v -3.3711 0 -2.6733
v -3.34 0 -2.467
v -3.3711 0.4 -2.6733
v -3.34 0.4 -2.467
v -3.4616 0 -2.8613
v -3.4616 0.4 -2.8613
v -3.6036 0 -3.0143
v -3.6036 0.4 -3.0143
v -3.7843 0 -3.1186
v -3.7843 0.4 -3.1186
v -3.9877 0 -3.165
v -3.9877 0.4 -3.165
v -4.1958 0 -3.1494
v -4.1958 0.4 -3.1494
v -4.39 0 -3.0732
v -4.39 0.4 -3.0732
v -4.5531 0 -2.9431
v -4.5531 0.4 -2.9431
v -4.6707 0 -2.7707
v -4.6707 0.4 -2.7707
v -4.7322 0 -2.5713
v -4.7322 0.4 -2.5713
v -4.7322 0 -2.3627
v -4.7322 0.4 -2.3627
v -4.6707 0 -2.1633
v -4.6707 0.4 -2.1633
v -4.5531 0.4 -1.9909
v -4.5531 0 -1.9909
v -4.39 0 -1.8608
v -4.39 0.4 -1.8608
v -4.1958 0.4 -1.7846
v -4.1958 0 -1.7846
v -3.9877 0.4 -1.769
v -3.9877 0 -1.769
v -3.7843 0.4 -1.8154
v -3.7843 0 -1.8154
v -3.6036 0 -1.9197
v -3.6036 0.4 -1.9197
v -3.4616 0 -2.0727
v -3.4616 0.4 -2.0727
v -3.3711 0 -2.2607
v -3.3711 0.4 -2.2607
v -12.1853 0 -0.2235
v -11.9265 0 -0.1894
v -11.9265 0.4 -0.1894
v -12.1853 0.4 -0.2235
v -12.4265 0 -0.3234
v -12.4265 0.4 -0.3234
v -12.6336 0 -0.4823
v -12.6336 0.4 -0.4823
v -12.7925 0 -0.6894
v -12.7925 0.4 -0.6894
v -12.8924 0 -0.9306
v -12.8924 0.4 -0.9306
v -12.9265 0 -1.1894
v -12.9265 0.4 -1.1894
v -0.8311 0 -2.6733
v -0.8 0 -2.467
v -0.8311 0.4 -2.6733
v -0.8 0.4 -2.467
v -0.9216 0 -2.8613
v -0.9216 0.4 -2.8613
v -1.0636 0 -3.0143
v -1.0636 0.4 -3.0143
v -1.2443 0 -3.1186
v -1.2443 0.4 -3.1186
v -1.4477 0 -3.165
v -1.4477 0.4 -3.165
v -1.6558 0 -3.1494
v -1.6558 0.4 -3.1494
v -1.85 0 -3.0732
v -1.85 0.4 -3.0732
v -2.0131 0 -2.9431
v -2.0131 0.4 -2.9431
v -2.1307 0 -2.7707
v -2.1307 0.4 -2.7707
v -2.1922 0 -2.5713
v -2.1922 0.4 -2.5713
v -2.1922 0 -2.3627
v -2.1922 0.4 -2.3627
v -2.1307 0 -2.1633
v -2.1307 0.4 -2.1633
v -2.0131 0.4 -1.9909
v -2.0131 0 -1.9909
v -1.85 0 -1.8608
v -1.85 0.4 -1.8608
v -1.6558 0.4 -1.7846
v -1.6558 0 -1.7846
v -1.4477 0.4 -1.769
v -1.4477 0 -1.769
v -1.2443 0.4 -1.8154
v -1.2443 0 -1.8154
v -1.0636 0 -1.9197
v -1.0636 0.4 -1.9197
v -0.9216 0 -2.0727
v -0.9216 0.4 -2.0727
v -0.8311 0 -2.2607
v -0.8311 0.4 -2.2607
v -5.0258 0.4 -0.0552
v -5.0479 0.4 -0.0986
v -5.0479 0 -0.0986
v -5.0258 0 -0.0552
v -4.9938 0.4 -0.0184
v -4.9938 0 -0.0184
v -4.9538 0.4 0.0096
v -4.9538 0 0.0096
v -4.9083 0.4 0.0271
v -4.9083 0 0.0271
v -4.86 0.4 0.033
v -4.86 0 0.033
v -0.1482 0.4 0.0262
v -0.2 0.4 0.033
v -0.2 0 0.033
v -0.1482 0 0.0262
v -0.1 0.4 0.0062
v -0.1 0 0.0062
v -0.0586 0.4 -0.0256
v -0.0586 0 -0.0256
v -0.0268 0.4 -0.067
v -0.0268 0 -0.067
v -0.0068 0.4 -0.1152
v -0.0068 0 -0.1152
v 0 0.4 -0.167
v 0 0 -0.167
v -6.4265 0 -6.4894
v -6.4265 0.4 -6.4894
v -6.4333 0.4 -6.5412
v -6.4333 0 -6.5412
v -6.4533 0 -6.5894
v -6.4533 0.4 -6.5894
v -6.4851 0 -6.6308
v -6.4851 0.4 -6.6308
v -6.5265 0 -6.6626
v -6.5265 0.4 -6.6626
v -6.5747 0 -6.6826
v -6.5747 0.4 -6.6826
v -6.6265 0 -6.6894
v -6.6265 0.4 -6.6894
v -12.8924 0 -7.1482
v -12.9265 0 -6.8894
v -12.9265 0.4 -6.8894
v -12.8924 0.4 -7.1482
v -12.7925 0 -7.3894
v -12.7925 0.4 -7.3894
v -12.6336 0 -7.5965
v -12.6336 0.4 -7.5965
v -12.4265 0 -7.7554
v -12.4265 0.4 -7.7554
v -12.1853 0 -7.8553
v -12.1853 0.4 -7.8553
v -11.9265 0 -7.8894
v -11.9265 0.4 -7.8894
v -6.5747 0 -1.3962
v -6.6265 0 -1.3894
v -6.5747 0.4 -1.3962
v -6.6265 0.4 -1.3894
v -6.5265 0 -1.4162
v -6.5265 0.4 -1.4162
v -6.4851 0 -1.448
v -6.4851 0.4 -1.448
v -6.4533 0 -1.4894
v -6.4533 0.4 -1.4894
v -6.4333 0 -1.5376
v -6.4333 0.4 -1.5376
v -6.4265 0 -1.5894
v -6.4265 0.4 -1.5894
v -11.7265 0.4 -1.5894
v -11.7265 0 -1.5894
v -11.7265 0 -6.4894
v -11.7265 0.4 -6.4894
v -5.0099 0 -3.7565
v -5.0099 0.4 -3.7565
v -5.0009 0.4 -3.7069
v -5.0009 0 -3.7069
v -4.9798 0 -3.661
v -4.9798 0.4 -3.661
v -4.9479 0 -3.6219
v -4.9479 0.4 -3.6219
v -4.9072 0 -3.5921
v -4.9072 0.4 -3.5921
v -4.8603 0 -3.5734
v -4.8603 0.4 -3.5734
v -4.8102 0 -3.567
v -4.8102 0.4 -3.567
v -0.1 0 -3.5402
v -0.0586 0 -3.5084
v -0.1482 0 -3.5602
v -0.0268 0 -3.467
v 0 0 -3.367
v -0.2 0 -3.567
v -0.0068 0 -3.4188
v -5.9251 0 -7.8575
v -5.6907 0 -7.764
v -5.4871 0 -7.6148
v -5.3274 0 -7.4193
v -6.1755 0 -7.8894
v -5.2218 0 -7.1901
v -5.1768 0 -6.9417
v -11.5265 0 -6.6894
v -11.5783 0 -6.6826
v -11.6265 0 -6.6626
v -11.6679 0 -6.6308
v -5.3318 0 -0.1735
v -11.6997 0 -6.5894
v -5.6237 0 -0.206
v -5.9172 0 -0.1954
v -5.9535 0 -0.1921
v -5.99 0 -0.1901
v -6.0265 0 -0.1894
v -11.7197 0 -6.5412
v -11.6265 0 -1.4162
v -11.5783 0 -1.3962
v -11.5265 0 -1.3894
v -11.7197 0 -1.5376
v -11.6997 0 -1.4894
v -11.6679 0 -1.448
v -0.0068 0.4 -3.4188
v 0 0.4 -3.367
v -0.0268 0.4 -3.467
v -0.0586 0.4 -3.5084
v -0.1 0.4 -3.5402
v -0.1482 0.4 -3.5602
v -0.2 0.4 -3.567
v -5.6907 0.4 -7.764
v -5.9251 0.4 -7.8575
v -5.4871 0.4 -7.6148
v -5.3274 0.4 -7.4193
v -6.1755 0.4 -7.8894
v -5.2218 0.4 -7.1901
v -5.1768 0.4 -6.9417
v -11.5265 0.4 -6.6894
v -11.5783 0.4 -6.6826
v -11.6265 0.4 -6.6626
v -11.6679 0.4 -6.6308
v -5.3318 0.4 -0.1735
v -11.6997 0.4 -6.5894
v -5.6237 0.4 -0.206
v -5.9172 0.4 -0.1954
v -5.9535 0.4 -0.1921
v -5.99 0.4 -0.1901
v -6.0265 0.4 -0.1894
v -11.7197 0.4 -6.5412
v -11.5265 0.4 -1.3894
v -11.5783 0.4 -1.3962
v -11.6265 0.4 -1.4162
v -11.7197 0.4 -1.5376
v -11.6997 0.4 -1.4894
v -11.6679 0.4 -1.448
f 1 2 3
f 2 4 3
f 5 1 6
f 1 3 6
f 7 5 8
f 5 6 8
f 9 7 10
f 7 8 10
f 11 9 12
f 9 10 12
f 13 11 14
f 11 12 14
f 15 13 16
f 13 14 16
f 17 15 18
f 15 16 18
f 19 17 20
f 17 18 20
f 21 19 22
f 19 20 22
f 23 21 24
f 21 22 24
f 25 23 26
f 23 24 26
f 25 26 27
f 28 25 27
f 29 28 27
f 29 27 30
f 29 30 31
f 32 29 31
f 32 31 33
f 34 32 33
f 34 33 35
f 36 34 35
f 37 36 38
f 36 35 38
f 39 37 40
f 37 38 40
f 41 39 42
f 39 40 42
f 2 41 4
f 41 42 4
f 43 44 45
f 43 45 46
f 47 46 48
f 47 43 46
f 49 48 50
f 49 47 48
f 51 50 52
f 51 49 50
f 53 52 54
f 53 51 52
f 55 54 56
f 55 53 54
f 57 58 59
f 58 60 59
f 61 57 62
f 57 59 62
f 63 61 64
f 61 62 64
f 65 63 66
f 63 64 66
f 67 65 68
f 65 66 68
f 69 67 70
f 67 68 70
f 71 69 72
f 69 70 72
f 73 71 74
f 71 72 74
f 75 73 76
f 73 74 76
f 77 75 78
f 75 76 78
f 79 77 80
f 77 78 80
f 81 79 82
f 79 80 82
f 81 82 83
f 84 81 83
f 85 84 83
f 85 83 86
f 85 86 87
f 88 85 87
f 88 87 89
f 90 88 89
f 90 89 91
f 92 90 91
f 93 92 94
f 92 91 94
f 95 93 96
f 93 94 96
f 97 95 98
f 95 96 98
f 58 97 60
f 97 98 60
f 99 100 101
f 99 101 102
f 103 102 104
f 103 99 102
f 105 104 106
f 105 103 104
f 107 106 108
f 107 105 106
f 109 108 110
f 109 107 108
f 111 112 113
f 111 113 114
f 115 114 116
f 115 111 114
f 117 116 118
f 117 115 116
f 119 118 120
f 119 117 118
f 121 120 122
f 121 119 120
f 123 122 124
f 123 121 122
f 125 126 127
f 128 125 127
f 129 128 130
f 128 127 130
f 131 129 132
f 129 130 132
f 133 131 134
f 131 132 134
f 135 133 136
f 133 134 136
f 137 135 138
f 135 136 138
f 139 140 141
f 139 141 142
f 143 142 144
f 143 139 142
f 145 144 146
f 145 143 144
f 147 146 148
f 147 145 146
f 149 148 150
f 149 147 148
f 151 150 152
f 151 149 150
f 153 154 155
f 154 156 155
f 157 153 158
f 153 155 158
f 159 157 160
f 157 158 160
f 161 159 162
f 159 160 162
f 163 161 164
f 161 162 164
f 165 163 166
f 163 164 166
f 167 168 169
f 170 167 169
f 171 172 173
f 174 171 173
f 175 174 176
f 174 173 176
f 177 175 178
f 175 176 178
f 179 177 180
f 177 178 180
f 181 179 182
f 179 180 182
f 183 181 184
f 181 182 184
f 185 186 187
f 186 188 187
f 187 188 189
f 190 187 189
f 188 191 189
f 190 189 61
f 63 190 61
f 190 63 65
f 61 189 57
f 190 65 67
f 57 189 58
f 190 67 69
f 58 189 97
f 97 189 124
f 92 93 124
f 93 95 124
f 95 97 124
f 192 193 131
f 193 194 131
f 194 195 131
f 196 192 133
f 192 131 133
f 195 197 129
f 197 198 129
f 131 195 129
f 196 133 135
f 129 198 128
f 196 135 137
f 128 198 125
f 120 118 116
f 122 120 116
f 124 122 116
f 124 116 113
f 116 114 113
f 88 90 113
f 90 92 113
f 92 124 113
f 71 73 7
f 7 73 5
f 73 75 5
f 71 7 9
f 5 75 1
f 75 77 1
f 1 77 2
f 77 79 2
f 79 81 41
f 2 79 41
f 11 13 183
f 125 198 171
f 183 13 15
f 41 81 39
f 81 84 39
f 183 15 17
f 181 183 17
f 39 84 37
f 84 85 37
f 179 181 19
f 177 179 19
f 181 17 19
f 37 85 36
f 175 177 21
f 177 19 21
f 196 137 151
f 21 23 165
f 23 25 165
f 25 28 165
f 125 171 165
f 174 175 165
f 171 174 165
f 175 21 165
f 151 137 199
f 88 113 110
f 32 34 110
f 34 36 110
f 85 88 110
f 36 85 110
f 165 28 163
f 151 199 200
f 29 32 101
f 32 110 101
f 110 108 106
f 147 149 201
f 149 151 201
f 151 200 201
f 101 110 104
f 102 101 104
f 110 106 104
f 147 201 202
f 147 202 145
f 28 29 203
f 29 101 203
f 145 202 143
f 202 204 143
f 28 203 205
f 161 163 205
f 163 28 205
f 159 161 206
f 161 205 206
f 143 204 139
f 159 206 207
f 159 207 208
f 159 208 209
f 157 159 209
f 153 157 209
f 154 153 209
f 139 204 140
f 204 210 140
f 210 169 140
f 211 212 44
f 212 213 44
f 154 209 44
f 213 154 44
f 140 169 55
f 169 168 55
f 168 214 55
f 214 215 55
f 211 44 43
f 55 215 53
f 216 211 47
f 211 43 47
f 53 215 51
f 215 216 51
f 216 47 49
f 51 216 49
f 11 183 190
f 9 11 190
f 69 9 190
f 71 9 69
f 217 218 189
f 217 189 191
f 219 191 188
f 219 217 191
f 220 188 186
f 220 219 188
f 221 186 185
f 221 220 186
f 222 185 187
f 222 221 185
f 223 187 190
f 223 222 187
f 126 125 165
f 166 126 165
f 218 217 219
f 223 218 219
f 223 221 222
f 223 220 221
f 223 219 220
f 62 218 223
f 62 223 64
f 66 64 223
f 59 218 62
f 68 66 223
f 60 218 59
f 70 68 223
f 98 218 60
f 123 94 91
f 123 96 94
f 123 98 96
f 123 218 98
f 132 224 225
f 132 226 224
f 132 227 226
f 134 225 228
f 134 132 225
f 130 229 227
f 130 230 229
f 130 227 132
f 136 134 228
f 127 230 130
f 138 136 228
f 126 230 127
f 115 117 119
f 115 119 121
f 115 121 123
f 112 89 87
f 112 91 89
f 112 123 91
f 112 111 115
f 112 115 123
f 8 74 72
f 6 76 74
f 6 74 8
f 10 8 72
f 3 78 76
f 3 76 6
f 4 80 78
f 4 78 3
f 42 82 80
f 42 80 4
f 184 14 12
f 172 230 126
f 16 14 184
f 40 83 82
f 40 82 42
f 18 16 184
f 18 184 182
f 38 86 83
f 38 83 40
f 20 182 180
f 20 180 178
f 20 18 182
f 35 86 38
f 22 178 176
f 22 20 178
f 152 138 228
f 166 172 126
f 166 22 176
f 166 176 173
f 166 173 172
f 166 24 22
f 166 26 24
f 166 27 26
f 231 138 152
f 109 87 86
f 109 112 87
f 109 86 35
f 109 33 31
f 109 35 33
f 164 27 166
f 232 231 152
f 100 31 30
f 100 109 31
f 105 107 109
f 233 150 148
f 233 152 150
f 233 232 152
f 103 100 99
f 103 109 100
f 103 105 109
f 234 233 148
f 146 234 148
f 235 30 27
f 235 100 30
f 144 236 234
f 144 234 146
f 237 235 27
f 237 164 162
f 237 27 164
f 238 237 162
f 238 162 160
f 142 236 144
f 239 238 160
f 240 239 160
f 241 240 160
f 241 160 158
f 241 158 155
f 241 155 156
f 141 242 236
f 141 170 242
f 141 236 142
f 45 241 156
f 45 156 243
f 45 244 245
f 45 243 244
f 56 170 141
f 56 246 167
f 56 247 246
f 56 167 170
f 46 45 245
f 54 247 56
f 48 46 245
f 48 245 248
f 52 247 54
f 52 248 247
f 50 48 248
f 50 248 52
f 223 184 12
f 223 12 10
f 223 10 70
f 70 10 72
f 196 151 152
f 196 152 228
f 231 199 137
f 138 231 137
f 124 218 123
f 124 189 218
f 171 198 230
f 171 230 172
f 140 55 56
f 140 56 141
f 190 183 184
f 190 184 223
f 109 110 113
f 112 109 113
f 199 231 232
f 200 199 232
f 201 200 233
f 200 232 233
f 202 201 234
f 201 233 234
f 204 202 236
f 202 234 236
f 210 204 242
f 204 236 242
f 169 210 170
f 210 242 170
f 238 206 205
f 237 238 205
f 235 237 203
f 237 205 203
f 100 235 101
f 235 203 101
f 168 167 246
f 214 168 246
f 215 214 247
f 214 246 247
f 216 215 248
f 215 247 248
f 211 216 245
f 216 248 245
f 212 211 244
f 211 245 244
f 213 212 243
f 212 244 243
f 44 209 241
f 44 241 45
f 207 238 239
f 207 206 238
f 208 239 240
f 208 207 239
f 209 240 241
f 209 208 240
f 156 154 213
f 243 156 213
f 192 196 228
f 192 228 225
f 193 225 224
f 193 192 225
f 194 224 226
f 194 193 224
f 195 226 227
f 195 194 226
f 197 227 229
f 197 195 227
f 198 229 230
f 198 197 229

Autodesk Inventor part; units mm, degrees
ref_plane "YZ Plane" through (0, 0, 0) normal (1, 0, 0) x (0, 1, 0)
ref_plane "XZ Plane" through (0, 0, 0) normal (0, 1, 0) x (-1, 0, 0)
ref_plane "XY Plane" through (0, 0, 0) normal (0, 0, 1) x (1, 0, 0)
sketch "Sketch1" plane through (0, 0, 0) normal (0, 1, 0) x (-1, 0, 0)
  line L0 (5, -3.567) -> (5, 0.033)
  line L1 (5, 0.033) -> (0, 0.033)
  line L2 (5.2265, -7.8894) -> (5, -3.567)
  line L3 (5.2265, -0.5894) -> (5, 0.033)
  line L4 (0, -3.567) -> (0, 0.033)
  line L5 (5, -3.567) -> (0, -3.567)
  line L6 (5.2265, -0.1894) -> (12.9265, -0.1894)
  line L7 (12.9265, -0.1894) -> (12.9265, -7.8894)
  line L8 (12.9265, -7.8894) -> (5.2265, -7.8894)
  line L9 (5.2265, -7.8894) -> (5.2265, -0.1894)
  line L10 (5.2265, -0.5894) -> (5.2265, -7.8894) construction
  line L11 (5.2265, -4.2394) -> (11.8919, -4.2394) construction
  line L12 (11.7265, -6.6894) -> (6.4265, -6.6894)
  line L13 (6.4265, -6.6894) -> (6.4265, -1.3894)
  line L14 (6.4265, -1.3894) -> (11.7265, -1.3894)
  line L15 (11.7265, -1.3894) -> (11.7265, -6.6894)
  point P0 (6.1218, -0.1118)
  point P1 (5.2265, -0.5894)
  point P2 (5.4261, -0.5894)
  dimension "d9" = 3.6
  dimension "d10" = 160
  dimension "d12" = 93
  dimension "d18" = 3.65
  dimension "d20" = 1.2
  dimension "d22" = 1.2
  dimension "d28" = 5
  dimension "d39" = 5.3
  dimension "d40" = 5.3
  dimension "d41" = 1.2
  dimension "d42" = 1.2
extrude "Extrusion1" add sketch "Sketch1" along normal blind 0.4
fillet "Fillet3" radius 1 4 edges at (-12.9265, 0.2, -0.1894) (-5.2265, 0.2, -0.1894) (-5.2265, 0.2, -7.8894) (-12.9265, 0.2, -7.8894)
fillet "Fillet4" radius 0.2 4 edges at (-6.4265, 0.2, -6.6894) (-11.7265, 0.2, -6.6894) (-11.7265, 0.2, -1.3894) (-6.4265, 0.2, -1.3894)
fillet "Fillet6" radius 0.2 4 edges at (-5, 0.2, 0.033) (0, 0.2, 0.033) (0, 0.2, -3.567) (-5, 0.2, -3.567)
sketch "Sketch2" plane through (0, 0.4, 0) normal (0, 1, 0) x (1, 0, 0)
  line L0 (0, 0.167) -> (0, 3.367) projected
  circle A0 centre (-4.04, 2.467) radius 0.7
  circle A1 centre (-1.5, 2.467) radius 0.7
  line L1 (-4.04, 2.467) -> (-1.5, 2.467) construction
  line L2 (-4.86, -0.033) -> (-0.2, -0.033) projected
  line L3 (-0.2, 3.567) -> (-4.8102, 3.567) projected
  point P0 (0, 0)
  dimension "d29" = 1.4
  dimension "d31" = 2.54
  dimension "d32" = 1.5
  dimension "d38" = 1.1
extrude "Extrusion2" cut sketch "Sketch2" against normal blind 0.4
fillet "Fillet8" [suppressed]
fillet "Fillet9" radius 2 1 edges at (-5.2265, 0.2, -0.5894)
equation "\"d18\" = 0.5 * d15"
equation "\"d15\" = 7.3"
properties part number "PCB_arm"
